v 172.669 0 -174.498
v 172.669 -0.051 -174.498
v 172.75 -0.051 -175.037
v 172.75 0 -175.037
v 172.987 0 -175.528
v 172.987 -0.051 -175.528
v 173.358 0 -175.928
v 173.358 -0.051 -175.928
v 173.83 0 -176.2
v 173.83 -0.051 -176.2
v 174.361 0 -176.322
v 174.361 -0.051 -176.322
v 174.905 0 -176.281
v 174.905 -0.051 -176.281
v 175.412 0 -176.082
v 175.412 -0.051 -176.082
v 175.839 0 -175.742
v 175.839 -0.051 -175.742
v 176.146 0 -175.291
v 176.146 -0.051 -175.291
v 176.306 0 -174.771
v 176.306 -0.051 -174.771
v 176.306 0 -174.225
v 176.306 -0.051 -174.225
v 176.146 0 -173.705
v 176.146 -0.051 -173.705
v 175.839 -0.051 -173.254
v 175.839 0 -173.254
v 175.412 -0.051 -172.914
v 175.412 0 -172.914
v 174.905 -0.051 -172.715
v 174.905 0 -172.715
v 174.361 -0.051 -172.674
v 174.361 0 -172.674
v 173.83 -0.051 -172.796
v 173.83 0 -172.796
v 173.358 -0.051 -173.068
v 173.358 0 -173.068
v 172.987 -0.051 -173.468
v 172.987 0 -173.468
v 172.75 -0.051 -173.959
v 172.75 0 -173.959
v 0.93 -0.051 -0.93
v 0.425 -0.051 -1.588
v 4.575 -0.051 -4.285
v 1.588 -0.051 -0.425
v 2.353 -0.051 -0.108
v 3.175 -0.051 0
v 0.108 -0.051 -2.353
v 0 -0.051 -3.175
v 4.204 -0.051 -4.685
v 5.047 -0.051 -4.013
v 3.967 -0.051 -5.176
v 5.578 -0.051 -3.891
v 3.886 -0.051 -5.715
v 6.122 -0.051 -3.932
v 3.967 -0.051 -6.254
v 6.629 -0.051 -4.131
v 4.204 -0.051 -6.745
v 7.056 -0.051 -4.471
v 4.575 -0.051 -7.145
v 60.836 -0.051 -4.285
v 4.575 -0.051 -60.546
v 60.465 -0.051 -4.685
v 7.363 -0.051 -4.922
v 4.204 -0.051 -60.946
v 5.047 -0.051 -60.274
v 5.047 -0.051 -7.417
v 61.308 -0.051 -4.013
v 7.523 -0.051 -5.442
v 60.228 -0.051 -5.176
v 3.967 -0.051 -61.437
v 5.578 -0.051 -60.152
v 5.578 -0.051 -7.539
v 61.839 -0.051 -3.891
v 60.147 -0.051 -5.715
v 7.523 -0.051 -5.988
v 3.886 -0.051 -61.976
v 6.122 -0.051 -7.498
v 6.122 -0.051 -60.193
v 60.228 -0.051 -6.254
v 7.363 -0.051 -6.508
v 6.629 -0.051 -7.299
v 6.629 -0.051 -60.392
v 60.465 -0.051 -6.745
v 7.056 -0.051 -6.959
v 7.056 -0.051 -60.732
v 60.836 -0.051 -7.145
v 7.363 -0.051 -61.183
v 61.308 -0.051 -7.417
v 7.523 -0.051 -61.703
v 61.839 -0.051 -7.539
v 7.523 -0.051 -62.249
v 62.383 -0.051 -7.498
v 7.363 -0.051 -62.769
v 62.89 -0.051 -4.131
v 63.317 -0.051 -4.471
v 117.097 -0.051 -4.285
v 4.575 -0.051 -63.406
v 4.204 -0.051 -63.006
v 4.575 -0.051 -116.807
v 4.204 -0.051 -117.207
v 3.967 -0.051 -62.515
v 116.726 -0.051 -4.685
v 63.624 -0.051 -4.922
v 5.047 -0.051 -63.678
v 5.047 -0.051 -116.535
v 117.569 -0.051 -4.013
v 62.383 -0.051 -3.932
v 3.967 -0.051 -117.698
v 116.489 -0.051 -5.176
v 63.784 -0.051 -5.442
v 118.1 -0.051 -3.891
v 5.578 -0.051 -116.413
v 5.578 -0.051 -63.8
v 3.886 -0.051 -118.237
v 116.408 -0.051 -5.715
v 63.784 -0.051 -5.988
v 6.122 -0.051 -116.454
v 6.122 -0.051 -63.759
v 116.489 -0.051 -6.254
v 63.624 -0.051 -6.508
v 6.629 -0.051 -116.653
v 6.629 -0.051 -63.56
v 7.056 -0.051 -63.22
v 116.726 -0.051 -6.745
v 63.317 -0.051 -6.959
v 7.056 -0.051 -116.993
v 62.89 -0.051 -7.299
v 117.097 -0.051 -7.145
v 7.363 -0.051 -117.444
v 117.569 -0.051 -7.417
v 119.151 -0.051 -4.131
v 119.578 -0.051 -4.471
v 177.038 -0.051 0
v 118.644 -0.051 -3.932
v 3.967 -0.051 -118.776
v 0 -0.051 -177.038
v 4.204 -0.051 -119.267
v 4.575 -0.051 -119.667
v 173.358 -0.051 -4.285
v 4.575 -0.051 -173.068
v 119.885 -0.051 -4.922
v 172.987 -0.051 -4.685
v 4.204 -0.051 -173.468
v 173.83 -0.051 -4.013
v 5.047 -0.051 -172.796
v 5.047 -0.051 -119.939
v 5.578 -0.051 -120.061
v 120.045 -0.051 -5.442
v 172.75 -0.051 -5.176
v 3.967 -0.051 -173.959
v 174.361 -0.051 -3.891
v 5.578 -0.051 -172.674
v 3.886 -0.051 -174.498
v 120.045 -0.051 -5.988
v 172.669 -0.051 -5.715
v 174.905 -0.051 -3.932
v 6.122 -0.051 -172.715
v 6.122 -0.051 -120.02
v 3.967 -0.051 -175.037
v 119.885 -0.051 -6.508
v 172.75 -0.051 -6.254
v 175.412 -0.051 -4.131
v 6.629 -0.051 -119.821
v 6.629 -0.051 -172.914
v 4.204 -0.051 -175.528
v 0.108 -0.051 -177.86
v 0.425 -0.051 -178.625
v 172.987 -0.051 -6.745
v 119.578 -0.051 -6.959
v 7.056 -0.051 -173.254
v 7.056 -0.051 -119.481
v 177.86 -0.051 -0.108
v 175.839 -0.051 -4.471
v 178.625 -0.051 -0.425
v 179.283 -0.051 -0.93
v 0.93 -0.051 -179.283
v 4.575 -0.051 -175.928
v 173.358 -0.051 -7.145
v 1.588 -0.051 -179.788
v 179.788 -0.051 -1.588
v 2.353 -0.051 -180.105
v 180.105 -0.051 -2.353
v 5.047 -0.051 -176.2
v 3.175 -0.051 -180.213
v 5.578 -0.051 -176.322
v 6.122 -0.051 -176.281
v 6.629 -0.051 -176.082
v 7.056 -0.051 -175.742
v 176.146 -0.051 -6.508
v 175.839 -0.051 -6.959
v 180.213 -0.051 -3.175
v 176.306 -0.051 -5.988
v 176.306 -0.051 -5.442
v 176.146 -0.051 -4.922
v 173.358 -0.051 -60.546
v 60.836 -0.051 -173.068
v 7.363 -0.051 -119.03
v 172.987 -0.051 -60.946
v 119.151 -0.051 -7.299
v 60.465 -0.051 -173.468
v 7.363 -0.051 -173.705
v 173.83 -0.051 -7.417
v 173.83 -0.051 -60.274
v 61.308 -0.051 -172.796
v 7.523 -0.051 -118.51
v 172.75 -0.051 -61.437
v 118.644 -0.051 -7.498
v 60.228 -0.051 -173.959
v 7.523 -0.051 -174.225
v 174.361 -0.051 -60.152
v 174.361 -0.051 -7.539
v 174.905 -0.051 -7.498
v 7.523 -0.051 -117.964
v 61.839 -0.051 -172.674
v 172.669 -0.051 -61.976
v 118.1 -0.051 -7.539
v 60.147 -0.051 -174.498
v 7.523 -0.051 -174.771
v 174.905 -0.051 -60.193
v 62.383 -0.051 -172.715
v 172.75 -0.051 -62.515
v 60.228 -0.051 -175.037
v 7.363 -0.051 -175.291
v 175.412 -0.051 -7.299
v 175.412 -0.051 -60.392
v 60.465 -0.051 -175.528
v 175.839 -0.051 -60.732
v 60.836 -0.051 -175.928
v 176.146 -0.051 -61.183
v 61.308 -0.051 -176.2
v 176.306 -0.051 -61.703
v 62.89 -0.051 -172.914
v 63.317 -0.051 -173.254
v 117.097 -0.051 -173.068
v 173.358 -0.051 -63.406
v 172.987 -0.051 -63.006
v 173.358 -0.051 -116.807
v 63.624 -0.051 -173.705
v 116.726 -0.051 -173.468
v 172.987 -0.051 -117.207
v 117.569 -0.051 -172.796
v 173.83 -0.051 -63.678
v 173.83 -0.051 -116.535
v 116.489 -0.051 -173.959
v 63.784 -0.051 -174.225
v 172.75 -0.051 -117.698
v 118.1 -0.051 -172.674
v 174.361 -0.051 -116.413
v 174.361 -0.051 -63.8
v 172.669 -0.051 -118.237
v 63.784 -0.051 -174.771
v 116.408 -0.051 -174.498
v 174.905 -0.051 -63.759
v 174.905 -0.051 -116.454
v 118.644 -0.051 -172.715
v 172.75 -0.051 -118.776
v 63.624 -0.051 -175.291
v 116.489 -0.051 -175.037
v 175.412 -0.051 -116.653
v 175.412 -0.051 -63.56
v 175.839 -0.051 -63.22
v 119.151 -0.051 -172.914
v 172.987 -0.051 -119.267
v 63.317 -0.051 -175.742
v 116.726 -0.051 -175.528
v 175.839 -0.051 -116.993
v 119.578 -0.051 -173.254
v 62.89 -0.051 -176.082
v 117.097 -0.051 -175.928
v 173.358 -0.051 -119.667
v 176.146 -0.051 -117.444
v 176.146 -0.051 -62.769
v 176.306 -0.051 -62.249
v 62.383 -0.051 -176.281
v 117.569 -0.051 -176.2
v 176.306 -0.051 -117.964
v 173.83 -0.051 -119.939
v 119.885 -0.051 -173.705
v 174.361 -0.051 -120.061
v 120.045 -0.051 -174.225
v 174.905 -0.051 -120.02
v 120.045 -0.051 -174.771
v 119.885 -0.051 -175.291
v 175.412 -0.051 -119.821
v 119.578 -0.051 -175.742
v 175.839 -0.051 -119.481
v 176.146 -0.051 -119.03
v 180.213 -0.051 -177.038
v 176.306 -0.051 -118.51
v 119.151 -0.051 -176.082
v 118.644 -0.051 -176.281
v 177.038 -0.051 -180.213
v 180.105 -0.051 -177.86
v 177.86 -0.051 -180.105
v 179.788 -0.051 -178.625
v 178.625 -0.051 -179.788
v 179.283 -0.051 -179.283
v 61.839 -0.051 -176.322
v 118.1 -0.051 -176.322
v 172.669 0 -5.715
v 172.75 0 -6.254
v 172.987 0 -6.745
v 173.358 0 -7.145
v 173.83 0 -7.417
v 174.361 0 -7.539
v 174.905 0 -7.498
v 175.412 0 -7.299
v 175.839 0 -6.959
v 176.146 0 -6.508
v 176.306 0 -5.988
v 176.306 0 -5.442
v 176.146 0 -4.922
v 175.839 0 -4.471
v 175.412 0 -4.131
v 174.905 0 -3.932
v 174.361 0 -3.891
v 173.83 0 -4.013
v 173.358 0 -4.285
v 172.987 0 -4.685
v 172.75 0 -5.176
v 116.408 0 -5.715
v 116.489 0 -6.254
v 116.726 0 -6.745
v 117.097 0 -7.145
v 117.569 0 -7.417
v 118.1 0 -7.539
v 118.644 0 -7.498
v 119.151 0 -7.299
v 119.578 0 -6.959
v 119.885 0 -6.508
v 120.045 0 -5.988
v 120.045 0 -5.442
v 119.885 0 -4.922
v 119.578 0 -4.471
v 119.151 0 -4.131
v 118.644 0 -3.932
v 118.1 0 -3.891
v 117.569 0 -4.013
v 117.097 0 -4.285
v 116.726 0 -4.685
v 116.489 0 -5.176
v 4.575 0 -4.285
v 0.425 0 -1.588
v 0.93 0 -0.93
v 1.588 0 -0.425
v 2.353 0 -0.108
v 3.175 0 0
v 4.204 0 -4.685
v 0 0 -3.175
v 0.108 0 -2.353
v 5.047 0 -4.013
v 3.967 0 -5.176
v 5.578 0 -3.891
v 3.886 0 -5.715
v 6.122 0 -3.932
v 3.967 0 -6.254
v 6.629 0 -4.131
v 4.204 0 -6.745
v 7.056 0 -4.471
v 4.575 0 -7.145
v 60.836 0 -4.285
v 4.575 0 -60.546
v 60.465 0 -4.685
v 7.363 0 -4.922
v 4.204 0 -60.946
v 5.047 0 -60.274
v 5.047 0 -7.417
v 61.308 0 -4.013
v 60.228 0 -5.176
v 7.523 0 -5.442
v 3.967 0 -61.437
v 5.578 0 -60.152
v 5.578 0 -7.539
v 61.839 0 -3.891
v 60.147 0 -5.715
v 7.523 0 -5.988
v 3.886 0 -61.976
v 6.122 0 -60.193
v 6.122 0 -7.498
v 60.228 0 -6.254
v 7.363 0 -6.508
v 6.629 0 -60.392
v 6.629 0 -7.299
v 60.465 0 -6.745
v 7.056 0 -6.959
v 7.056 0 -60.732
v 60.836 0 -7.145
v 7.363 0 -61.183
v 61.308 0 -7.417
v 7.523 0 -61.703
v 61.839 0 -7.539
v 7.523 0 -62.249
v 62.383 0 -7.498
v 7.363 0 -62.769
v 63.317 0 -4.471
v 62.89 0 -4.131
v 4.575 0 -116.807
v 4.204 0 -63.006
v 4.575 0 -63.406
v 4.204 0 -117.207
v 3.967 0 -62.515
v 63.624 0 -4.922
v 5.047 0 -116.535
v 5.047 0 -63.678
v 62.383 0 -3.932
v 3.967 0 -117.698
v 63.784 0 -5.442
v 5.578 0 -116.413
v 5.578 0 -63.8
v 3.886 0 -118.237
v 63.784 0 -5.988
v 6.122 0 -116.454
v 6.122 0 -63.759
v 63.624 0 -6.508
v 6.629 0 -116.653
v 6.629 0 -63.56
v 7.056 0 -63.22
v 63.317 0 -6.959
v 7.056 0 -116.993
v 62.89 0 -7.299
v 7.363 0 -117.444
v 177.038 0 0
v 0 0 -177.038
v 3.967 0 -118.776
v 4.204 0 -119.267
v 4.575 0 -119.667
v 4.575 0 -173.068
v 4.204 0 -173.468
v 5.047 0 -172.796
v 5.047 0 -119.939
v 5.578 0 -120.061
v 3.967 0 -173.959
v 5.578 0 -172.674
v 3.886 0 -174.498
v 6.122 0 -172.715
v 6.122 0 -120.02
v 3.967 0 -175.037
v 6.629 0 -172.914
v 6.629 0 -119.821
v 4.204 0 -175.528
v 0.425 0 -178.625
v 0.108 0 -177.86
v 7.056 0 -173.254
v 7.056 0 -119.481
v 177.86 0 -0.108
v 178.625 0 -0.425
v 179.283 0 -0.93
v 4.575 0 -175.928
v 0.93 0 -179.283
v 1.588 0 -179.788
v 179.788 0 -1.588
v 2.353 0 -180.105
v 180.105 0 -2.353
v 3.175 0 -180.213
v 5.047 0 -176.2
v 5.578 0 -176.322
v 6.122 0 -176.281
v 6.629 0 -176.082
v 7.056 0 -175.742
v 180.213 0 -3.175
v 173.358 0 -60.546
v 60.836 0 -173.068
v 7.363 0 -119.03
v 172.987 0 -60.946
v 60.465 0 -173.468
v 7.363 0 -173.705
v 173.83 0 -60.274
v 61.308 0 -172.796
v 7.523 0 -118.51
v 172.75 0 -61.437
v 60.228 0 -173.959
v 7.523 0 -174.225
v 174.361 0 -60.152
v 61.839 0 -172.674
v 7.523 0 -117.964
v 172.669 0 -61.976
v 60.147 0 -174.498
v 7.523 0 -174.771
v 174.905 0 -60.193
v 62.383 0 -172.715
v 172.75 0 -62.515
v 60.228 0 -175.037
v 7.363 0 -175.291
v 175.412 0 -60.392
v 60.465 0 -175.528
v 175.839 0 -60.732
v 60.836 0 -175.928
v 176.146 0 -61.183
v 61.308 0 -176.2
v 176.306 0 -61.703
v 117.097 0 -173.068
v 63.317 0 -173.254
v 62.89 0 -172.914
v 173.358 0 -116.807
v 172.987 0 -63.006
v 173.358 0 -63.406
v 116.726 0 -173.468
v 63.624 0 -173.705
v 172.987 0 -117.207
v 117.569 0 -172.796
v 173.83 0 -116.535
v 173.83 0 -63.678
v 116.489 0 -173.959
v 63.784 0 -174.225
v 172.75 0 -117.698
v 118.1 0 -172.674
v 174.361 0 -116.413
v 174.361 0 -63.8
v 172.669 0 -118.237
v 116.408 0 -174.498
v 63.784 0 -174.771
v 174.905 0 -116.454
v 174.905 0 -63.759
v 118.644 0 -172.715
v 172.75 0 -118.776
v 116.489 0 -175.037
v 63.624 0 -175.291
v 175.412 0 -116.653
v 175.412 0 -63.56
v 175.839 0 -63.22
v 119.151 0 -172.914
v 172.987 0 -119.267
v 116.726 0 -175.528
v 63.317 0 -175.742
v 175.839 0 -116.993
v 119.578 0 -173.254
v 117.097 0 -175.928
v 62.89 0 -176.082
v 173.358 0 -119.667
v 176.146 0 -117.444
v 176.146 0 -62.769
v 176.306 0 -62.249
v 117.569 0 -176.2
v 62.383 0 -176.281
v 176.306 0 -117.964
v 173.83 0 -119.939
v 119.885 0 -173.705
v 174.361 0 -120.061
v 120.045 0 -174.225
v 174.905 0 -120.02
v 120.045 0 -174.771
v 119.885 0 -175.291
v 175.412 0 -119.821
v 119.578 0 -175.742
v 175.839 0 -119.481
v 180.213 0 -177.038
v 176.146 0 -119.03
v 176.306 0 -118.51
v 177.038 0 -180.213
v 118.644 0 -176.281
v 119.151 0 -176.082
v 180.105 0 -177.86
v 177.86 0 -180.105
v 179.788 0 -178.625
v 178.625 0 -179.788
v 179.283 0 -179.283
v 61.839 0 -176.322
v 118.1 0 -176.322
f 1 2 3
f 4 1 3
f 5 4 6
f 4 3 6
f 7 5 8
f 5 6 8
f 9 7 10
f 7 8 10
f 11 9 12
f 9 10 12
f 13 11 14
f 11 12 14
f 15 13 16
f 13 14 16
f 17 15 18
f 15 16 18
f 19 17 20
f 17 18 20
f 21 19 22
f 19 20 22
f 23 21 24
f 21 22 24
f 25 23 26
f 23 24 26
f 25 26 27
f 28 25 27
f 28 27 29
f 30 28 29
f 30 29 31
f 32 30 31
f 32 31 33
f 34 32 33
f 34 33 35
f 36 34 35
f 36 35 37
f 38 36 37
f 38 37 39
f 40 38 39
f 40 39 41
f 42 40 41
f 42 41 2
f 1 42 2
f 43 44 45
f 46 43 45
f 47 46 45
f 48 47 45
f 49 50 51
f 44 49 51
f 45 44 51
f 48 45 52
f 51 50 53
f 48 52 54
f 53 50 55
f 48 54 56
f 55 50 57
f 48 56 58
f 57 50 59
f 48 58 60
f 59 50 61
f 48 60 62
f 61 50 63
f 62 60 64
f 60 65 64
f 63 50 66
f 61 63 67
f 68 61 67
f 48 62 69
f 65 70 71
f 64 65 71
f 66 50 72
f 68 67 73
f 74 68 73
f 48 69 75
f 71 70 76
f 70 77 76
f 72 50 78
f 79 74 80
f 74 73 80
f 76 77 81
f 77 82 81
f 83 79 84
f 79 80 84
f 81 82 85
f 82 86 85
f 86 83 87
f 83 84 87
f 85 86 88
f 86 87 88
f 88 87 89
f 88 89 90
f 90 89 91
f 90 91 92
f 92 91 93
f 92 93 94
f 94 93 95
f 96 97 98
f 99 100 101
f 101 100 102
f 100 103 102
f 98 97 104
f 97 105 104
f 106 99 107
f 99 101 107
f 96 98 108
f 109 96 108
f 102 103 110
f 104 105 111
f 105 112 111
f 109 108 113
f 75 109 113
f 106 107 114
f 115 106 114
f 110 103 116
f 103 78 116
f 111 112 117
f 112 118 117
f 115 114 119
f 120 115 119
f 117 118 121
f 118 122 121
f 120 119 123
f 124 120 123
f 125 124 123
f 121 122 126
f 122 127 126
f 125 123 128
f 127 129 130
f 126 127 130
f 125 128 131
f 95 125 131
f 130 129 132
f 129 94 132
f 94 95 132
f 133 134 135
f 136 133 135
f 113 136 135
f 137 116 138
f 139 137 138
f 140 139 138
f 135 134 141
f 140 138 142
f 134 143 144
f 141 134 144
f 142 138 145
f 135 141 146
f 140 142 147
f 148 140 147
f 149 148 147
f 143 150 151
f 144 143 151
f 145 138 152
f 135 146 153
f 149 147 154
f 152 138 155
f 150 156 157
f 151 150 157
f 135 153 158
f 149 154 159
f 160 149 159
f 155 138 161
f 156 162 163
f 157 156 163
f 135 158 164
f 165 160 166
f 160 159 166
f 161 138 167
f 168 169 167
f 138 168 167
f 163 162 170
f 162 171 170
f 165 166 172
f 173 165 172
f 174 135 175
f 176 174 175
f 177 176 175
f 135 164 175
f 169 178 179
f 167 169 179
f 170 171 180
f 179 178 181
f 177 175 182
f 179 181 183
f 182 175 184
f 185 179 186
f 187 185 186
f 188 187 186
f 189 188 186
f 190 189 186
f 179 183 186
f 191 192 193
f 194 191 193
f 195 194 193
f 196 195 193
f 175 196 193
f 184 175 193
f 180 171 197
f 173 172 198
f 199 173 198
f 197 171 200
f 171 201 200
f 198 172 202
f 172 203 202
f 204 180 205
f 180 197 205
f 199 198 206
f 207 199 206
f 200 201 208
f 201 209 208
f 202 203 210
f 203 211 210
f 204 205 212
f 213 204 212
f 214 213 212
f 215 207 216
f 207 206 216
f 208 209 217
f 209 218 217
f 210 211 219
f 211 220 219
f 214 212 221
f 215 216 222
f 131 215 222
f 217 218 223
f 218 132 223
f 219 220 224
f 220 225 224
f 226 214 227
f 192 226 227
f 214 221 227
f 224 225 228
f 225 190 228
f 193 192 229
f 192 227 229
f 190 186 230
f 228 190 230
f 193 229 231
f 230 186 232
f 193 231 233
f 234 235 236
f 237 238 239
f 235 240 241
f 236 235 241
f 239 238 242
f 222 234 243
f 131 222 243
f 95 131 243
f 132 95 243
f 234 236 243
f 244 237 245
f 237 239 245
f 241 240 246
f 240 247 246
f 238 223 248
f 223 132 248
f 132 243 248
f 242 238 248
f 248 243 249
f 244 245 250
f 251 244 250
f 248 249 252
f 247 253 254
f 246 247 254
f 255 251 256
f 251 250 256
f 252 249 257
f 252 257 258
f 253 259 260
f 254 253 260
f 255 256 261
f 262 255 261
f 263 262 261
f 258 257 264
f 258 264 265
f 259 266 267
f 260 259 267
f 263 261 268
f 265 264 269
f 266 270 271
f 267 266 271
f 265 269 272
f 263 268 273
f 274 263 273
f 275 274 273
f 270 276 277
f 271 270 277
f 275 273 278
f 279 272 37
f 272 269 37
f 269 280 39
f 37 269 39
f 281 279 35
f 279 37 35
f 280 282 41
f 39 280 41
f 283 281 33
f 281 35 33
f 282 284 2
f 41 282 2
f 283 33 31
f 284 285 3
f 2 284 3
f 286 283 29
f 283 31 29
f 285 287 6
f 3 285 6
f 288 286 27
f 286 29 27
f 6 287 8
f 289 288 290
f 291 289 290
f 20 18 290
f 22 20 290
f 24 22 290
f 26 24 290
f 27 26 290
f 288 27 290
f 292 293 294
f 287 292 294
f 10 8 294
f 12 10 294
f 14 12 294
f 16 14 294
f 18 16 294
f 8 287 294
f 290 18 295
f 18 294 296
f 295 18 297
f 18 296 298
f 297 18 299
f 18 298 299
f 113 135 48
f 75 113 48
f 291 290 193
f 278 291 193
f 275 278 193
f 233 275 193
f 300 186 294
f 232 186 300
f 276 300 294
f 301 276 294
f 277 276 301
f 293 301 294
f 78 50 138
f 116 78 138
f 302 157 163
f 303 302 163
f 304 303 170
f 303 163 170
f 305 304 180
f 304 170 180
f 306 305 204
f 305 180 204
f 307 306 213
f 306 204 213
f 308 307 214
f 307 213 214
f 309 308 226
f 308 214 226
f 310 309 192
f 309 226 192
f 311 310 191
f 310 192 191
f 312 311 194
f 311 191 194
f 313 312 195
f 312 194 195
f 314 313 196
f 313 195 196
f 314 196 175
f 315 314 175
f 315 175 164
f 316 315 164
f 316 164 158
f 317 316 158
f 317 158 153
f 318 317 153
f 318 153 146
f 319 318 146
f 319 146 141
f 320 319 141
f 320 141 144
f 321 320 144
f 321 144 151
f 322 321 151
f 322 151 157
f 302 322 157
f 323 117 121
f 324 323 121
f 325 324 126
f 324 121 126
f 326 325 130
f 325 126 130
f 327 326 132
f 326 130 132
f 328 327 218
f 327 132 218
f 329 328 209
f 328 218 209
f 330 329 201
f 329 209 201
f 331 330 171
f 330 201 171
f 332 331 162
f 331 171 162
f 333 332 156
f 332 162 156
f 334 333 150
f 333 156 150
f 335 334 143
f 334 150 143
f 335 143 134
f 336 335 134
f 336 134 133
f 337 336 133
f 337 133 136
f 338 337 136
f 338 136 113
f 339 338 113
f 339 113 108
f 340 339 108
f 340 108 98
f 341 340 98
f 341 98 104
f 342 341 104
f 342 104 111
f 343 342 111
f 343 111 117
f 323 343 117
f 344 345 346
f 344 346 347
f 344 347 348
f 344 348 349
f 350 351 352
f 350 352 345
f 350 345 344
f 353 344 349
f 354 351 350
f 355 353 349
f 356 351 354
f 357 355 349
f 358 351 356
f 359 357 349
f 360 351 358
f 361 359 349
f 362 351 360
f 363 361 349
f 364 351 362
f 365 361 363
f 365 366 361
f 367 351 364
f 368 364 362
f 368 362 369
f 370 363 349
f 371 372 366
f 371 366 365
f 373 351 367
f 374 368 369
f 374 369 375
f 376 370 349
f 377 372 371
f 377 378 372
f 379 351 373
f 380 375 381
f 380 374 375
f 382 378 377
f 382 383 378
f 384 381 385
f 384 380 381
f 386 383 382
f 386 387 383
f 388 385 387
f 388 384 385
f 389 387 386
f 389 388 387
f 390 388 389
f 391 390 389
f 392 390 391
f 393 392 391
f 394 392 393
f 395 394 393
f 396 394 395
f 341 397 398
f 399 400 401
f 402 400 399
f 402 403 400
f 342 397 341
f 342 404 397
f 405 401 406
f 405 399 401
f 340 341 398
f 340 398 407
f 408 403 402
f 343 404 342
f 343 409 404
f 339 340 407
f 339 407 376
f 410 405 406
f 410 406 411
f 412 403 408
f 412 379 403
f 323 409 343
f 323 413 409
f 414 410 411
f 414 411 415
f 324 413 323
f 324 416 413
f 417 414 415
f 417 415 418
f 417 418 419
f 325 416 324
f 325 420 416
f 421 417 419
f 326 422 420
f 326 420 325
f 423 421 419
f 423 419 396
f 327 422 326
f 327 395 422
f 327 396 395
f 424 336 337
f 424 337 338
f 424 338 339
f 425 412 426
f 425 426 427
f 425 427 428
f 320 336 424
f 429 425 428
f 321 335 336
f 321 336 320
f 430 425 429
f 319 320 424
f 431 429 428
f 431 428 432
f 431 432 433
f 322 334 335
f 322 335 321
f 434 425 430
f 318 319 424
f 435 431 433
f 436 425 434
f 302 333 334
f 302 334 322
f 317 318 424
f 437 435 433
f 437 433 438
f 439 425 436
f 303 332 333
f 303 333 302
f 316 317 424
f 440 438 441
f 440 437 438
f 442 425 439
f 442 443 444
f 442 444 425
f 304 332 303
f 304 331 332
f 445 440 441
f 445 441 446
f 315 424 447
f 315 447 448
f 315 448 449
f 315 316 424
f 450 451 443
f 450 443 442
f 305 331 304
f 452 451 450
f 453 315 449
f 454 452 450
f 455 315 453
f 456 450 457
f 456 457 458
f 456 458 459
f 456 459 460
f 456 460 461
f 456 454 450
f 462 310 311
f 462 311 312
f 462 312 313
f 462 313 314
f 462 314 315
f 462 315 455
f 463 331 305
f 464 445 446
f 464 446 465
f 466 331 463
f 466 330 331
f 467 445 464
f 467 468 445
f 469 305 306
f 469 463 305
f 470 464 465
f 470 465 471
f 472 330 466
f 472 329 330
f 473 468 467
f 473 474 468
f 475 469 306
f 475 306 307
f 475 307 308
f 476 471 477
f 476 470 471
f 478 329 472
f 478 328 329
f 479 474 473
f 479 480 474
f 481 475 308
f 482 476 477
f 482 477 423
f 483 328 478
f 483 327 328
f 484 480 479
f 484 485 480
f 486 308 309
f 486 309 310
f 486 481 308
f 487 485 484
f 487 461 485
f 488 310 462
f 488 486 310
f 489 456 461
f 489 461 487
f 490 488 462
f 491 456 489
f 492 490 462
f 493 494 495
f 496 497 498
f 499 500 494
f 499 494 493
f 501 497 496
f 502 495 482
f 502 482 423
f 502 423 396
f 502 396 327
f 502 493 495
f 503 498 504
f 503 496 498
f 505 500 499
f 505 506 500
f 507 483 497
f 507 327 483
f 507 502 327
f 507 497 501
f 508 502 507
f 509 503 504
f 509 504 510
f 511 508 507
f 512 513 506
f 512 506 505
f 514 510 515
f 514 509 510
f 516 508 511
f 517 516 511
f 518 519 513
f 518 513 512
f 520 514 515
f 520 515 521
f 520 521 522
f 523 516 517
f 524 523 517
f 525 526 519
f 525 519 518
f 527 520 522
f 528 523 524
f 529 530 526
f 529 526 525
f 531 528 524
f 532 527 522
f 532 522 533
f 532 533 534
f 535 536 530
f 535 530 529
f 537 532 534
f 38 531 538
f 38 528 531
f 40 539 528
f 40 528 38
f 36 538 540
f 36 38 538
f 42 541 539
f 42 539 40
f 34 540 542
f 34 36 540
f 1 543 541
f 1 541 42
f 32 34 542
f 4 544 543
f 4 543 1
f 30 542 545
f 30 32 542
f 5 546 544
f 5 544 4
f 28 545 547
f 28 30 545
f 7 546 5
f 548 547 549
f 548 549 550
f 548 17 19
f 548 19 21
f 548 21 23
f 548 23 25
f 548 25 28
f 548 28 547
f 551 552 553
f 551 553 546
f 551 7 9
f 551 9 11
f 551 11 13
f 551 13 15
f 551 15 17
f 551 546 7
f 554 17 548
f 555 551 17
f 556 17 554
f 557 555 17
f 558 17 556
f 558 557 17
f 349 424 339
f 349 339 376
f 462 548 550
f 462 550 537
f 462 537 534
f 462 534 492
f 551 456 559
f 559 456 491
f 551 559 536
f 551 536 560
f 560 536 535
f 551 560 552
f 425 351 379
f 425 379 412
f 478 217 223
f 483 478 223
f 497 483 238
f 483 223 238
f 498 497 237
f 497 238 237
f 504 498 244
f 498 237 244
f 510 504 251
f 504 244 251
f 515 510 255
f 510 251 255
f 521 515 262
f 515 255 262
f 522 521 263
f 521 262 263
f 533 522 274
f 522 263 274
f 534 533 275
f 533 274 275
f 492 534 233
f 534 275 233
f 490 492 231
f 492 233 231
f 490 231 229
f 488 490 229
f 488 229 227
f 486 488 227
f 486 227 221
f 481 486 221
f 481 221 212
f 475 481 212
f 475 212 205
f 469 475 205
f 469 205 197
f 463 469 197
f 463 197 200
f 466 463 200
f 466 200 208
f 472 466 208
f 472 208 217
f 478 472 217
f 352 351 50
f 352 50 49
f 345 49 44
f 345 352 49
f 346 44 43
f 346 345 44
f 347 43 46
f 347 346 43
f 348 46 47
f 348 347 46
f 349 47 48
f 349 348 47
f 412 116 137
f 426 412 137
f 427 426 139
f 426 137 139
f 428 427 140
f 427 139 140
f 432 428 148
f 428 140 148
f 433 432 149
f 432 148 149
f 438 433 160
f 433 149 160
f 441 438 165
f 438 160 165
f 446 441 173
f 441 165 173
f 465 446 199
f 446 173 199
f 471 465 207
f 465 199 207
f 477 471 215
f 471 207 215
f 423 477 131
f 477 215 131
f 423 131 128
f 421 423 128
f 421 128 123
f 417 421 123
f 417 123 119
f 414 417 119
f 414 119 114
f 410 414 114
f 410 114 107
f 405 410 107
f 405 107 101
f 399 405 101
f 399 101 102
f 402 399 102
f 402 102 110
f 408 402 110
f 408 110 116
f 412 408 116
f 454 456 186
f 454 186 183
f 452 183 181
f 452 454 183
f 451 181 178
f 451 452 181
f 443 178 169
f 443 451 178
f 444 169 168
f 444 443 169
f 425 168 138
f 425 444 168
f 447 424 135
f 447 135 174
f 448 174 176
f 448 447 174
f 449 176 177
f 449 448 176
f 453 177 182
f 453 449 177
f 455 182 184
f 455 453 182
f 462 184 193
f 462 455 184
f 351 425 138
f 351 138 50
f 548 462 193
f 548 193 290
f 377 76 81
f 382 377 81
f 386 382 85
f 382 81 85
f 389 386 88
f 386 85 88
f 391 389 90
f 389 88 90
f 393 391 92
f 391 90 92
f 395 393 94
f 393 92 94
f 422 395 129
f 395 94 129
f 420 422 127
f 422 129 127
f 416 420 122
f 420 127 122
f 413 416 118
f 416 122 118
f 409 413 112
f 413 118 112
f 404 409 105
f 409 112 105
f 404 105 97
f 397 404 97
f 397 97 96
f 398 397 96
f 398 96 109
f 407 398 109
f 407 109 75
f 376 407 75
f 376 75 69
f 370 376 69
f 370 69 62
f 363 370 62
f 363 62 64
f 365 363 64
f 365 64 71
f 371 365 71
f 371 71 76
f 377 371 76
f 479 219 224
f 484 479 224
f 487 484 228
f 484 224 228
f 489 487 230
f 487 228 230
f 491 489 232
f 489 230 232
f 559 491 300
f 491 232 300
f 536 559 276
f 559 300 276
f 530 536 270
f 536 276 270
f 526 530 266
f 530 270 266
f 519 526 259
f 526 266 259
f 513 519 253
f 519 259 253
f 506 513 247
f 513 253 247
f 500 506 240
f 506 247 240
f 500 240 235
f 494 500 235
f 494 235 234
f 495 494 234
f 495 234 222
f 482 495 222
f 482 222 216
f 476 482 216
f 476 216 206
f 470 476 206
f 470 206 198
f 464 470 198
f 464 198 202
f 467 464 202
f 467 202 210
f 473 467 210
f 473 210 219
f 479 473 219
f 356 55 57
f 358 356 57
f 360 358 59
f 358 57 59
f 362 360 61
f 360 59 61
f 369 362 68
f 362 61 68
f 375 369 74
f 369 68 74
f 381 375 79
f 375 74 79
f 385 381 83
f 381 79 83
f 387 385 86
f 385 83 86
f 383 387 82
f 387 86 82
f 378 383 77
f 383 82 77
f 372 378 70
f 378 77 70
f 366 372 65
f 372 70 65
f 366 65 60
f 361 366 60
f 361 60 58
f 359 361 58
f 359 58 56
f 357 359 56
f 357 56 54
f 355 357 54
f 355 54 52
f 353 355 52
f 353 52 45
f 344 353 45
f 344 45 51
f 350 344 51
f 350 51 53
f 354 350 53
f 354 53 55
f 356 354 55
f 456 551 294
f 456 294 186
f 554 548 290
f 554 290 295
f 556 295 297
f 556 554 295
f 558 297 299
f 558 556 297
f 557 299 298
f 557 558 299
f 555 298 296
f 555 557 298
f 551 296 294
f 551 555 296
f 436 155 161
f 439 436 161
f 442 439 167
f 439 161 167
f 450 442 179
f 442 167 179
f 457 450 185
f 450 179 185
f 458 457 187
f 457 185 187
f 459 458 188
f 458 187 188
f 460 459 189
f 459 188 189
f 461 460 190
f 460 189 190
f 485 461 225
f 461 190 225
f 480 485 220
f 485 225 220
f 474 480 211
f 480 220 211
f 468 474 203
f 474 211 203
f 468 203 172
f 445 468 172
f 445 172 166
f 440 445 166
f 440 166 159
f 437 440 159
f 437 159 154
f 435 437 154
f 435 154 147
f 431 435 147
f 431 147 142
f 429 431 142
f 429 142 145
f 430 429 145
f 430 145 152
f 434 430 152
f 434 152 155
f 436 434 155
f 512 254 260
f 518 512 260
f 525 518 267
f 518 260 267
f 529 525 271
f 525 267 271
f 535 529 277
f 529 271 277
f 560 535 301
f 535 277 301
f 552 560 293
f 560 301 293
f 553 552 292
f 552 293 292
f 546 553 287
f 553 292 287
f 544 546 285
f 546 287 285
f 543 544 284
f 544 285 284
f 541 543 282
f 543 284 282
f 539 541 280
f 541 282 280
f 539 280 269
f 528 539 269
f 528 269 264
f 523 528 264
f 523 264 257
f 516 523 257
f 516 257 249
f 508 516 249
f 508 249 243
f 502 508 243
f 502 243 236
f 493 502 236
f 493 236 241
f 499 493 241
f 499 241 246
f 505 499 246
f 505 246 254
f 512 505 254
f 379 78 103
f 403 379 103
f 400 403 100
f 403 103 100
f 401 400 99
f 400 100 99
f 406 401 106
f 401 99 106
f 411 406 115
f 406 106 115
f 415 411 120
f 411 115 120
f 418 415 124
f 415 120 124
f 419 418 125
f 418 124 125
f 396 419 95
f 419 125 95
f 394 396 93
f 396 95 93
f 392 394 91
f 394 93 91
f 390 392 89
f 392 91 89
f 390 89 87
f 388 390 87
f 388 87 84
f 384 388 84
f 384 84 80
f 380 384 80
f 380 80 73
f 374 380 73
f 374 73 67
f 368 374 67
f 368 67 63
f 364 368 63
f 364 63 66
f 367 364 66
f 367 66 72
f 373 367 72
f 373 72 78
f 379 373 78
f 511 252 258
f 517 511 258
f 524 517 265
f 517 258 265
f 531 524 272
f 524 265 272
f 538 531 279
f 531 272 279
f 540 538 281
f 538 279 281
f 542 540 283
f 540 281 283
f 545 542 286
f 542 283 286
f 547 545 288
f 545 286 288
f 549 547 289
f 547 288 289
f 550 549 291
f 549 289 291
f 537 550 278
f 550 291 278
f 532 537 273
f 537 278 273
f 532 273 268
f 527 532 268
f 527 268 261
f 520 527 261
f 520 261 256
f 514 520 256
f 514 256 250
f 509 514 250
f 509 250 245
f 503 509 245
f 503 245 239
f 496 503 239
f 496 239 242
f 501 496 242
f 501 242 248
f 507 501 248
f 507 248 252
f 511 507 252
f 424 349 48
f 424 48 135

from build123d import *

# Parameters (mm, degrees)
BASE_FLANGE1_DEPTH    = 0.0508
F_6_CLEARANCE_HOLE1_D = 3.6576


# Sheet-metal steps are written as plain solids
with BuildPart() as part:
    # Sketch2 → Base-Flange1 (new body)
    with BuildSketch(Plane(origin=(0, 0, 0), x_dir=(1, 0, 0), z_dir=(0, 1, 0))):
        with BuildLine():
            Line((3.175, 0), (177.038, 0))
            ThreePointArc((177.038, 0), (179.28306403, 0.92993597), (180.213, 3.175))
            Line((180.213, 3.175), (180.213, 177.038))
            ThreePointArc((180.213, 177.038), (179.28306403, 179.28306403), (177.038, 180.213))
            Line((177.038, 180.213), (3.175, 180.213))
            ThreePointArc((3.175, 180.213), (0.92993597, 179.28306403), (0, 177.038))
            Line((0, 177.038), (0, 3.175))
            ThreePointArc((0, 3.175), (0.92993597, 0.92993597), (3.175, 0))
        make_face()
    extrude(amount=-BASE_FLANGE1_DEPTH)

    # #6 Clearance Hole1 (through all)
    with Locations(Plane(origin=(0, 0, 0), x_dir=(1, 0, 0), z_dir=(0, 1, 0))):
        with Locations((118.237, 5.715), (174.498, 5.715), (174.498, 61.976), (174.498, 118.237), (174.498, 174.498), (118.237, 174.498), (61.976, 174.498), (5.715, 174.498), (5.715, 118.237), (5.715, 61.976), (5.715, 5.715), (61.976, 5.715)):
            Hole(F_6_CLEARANCE_HOLE1_D / 2)


solid = part.part
